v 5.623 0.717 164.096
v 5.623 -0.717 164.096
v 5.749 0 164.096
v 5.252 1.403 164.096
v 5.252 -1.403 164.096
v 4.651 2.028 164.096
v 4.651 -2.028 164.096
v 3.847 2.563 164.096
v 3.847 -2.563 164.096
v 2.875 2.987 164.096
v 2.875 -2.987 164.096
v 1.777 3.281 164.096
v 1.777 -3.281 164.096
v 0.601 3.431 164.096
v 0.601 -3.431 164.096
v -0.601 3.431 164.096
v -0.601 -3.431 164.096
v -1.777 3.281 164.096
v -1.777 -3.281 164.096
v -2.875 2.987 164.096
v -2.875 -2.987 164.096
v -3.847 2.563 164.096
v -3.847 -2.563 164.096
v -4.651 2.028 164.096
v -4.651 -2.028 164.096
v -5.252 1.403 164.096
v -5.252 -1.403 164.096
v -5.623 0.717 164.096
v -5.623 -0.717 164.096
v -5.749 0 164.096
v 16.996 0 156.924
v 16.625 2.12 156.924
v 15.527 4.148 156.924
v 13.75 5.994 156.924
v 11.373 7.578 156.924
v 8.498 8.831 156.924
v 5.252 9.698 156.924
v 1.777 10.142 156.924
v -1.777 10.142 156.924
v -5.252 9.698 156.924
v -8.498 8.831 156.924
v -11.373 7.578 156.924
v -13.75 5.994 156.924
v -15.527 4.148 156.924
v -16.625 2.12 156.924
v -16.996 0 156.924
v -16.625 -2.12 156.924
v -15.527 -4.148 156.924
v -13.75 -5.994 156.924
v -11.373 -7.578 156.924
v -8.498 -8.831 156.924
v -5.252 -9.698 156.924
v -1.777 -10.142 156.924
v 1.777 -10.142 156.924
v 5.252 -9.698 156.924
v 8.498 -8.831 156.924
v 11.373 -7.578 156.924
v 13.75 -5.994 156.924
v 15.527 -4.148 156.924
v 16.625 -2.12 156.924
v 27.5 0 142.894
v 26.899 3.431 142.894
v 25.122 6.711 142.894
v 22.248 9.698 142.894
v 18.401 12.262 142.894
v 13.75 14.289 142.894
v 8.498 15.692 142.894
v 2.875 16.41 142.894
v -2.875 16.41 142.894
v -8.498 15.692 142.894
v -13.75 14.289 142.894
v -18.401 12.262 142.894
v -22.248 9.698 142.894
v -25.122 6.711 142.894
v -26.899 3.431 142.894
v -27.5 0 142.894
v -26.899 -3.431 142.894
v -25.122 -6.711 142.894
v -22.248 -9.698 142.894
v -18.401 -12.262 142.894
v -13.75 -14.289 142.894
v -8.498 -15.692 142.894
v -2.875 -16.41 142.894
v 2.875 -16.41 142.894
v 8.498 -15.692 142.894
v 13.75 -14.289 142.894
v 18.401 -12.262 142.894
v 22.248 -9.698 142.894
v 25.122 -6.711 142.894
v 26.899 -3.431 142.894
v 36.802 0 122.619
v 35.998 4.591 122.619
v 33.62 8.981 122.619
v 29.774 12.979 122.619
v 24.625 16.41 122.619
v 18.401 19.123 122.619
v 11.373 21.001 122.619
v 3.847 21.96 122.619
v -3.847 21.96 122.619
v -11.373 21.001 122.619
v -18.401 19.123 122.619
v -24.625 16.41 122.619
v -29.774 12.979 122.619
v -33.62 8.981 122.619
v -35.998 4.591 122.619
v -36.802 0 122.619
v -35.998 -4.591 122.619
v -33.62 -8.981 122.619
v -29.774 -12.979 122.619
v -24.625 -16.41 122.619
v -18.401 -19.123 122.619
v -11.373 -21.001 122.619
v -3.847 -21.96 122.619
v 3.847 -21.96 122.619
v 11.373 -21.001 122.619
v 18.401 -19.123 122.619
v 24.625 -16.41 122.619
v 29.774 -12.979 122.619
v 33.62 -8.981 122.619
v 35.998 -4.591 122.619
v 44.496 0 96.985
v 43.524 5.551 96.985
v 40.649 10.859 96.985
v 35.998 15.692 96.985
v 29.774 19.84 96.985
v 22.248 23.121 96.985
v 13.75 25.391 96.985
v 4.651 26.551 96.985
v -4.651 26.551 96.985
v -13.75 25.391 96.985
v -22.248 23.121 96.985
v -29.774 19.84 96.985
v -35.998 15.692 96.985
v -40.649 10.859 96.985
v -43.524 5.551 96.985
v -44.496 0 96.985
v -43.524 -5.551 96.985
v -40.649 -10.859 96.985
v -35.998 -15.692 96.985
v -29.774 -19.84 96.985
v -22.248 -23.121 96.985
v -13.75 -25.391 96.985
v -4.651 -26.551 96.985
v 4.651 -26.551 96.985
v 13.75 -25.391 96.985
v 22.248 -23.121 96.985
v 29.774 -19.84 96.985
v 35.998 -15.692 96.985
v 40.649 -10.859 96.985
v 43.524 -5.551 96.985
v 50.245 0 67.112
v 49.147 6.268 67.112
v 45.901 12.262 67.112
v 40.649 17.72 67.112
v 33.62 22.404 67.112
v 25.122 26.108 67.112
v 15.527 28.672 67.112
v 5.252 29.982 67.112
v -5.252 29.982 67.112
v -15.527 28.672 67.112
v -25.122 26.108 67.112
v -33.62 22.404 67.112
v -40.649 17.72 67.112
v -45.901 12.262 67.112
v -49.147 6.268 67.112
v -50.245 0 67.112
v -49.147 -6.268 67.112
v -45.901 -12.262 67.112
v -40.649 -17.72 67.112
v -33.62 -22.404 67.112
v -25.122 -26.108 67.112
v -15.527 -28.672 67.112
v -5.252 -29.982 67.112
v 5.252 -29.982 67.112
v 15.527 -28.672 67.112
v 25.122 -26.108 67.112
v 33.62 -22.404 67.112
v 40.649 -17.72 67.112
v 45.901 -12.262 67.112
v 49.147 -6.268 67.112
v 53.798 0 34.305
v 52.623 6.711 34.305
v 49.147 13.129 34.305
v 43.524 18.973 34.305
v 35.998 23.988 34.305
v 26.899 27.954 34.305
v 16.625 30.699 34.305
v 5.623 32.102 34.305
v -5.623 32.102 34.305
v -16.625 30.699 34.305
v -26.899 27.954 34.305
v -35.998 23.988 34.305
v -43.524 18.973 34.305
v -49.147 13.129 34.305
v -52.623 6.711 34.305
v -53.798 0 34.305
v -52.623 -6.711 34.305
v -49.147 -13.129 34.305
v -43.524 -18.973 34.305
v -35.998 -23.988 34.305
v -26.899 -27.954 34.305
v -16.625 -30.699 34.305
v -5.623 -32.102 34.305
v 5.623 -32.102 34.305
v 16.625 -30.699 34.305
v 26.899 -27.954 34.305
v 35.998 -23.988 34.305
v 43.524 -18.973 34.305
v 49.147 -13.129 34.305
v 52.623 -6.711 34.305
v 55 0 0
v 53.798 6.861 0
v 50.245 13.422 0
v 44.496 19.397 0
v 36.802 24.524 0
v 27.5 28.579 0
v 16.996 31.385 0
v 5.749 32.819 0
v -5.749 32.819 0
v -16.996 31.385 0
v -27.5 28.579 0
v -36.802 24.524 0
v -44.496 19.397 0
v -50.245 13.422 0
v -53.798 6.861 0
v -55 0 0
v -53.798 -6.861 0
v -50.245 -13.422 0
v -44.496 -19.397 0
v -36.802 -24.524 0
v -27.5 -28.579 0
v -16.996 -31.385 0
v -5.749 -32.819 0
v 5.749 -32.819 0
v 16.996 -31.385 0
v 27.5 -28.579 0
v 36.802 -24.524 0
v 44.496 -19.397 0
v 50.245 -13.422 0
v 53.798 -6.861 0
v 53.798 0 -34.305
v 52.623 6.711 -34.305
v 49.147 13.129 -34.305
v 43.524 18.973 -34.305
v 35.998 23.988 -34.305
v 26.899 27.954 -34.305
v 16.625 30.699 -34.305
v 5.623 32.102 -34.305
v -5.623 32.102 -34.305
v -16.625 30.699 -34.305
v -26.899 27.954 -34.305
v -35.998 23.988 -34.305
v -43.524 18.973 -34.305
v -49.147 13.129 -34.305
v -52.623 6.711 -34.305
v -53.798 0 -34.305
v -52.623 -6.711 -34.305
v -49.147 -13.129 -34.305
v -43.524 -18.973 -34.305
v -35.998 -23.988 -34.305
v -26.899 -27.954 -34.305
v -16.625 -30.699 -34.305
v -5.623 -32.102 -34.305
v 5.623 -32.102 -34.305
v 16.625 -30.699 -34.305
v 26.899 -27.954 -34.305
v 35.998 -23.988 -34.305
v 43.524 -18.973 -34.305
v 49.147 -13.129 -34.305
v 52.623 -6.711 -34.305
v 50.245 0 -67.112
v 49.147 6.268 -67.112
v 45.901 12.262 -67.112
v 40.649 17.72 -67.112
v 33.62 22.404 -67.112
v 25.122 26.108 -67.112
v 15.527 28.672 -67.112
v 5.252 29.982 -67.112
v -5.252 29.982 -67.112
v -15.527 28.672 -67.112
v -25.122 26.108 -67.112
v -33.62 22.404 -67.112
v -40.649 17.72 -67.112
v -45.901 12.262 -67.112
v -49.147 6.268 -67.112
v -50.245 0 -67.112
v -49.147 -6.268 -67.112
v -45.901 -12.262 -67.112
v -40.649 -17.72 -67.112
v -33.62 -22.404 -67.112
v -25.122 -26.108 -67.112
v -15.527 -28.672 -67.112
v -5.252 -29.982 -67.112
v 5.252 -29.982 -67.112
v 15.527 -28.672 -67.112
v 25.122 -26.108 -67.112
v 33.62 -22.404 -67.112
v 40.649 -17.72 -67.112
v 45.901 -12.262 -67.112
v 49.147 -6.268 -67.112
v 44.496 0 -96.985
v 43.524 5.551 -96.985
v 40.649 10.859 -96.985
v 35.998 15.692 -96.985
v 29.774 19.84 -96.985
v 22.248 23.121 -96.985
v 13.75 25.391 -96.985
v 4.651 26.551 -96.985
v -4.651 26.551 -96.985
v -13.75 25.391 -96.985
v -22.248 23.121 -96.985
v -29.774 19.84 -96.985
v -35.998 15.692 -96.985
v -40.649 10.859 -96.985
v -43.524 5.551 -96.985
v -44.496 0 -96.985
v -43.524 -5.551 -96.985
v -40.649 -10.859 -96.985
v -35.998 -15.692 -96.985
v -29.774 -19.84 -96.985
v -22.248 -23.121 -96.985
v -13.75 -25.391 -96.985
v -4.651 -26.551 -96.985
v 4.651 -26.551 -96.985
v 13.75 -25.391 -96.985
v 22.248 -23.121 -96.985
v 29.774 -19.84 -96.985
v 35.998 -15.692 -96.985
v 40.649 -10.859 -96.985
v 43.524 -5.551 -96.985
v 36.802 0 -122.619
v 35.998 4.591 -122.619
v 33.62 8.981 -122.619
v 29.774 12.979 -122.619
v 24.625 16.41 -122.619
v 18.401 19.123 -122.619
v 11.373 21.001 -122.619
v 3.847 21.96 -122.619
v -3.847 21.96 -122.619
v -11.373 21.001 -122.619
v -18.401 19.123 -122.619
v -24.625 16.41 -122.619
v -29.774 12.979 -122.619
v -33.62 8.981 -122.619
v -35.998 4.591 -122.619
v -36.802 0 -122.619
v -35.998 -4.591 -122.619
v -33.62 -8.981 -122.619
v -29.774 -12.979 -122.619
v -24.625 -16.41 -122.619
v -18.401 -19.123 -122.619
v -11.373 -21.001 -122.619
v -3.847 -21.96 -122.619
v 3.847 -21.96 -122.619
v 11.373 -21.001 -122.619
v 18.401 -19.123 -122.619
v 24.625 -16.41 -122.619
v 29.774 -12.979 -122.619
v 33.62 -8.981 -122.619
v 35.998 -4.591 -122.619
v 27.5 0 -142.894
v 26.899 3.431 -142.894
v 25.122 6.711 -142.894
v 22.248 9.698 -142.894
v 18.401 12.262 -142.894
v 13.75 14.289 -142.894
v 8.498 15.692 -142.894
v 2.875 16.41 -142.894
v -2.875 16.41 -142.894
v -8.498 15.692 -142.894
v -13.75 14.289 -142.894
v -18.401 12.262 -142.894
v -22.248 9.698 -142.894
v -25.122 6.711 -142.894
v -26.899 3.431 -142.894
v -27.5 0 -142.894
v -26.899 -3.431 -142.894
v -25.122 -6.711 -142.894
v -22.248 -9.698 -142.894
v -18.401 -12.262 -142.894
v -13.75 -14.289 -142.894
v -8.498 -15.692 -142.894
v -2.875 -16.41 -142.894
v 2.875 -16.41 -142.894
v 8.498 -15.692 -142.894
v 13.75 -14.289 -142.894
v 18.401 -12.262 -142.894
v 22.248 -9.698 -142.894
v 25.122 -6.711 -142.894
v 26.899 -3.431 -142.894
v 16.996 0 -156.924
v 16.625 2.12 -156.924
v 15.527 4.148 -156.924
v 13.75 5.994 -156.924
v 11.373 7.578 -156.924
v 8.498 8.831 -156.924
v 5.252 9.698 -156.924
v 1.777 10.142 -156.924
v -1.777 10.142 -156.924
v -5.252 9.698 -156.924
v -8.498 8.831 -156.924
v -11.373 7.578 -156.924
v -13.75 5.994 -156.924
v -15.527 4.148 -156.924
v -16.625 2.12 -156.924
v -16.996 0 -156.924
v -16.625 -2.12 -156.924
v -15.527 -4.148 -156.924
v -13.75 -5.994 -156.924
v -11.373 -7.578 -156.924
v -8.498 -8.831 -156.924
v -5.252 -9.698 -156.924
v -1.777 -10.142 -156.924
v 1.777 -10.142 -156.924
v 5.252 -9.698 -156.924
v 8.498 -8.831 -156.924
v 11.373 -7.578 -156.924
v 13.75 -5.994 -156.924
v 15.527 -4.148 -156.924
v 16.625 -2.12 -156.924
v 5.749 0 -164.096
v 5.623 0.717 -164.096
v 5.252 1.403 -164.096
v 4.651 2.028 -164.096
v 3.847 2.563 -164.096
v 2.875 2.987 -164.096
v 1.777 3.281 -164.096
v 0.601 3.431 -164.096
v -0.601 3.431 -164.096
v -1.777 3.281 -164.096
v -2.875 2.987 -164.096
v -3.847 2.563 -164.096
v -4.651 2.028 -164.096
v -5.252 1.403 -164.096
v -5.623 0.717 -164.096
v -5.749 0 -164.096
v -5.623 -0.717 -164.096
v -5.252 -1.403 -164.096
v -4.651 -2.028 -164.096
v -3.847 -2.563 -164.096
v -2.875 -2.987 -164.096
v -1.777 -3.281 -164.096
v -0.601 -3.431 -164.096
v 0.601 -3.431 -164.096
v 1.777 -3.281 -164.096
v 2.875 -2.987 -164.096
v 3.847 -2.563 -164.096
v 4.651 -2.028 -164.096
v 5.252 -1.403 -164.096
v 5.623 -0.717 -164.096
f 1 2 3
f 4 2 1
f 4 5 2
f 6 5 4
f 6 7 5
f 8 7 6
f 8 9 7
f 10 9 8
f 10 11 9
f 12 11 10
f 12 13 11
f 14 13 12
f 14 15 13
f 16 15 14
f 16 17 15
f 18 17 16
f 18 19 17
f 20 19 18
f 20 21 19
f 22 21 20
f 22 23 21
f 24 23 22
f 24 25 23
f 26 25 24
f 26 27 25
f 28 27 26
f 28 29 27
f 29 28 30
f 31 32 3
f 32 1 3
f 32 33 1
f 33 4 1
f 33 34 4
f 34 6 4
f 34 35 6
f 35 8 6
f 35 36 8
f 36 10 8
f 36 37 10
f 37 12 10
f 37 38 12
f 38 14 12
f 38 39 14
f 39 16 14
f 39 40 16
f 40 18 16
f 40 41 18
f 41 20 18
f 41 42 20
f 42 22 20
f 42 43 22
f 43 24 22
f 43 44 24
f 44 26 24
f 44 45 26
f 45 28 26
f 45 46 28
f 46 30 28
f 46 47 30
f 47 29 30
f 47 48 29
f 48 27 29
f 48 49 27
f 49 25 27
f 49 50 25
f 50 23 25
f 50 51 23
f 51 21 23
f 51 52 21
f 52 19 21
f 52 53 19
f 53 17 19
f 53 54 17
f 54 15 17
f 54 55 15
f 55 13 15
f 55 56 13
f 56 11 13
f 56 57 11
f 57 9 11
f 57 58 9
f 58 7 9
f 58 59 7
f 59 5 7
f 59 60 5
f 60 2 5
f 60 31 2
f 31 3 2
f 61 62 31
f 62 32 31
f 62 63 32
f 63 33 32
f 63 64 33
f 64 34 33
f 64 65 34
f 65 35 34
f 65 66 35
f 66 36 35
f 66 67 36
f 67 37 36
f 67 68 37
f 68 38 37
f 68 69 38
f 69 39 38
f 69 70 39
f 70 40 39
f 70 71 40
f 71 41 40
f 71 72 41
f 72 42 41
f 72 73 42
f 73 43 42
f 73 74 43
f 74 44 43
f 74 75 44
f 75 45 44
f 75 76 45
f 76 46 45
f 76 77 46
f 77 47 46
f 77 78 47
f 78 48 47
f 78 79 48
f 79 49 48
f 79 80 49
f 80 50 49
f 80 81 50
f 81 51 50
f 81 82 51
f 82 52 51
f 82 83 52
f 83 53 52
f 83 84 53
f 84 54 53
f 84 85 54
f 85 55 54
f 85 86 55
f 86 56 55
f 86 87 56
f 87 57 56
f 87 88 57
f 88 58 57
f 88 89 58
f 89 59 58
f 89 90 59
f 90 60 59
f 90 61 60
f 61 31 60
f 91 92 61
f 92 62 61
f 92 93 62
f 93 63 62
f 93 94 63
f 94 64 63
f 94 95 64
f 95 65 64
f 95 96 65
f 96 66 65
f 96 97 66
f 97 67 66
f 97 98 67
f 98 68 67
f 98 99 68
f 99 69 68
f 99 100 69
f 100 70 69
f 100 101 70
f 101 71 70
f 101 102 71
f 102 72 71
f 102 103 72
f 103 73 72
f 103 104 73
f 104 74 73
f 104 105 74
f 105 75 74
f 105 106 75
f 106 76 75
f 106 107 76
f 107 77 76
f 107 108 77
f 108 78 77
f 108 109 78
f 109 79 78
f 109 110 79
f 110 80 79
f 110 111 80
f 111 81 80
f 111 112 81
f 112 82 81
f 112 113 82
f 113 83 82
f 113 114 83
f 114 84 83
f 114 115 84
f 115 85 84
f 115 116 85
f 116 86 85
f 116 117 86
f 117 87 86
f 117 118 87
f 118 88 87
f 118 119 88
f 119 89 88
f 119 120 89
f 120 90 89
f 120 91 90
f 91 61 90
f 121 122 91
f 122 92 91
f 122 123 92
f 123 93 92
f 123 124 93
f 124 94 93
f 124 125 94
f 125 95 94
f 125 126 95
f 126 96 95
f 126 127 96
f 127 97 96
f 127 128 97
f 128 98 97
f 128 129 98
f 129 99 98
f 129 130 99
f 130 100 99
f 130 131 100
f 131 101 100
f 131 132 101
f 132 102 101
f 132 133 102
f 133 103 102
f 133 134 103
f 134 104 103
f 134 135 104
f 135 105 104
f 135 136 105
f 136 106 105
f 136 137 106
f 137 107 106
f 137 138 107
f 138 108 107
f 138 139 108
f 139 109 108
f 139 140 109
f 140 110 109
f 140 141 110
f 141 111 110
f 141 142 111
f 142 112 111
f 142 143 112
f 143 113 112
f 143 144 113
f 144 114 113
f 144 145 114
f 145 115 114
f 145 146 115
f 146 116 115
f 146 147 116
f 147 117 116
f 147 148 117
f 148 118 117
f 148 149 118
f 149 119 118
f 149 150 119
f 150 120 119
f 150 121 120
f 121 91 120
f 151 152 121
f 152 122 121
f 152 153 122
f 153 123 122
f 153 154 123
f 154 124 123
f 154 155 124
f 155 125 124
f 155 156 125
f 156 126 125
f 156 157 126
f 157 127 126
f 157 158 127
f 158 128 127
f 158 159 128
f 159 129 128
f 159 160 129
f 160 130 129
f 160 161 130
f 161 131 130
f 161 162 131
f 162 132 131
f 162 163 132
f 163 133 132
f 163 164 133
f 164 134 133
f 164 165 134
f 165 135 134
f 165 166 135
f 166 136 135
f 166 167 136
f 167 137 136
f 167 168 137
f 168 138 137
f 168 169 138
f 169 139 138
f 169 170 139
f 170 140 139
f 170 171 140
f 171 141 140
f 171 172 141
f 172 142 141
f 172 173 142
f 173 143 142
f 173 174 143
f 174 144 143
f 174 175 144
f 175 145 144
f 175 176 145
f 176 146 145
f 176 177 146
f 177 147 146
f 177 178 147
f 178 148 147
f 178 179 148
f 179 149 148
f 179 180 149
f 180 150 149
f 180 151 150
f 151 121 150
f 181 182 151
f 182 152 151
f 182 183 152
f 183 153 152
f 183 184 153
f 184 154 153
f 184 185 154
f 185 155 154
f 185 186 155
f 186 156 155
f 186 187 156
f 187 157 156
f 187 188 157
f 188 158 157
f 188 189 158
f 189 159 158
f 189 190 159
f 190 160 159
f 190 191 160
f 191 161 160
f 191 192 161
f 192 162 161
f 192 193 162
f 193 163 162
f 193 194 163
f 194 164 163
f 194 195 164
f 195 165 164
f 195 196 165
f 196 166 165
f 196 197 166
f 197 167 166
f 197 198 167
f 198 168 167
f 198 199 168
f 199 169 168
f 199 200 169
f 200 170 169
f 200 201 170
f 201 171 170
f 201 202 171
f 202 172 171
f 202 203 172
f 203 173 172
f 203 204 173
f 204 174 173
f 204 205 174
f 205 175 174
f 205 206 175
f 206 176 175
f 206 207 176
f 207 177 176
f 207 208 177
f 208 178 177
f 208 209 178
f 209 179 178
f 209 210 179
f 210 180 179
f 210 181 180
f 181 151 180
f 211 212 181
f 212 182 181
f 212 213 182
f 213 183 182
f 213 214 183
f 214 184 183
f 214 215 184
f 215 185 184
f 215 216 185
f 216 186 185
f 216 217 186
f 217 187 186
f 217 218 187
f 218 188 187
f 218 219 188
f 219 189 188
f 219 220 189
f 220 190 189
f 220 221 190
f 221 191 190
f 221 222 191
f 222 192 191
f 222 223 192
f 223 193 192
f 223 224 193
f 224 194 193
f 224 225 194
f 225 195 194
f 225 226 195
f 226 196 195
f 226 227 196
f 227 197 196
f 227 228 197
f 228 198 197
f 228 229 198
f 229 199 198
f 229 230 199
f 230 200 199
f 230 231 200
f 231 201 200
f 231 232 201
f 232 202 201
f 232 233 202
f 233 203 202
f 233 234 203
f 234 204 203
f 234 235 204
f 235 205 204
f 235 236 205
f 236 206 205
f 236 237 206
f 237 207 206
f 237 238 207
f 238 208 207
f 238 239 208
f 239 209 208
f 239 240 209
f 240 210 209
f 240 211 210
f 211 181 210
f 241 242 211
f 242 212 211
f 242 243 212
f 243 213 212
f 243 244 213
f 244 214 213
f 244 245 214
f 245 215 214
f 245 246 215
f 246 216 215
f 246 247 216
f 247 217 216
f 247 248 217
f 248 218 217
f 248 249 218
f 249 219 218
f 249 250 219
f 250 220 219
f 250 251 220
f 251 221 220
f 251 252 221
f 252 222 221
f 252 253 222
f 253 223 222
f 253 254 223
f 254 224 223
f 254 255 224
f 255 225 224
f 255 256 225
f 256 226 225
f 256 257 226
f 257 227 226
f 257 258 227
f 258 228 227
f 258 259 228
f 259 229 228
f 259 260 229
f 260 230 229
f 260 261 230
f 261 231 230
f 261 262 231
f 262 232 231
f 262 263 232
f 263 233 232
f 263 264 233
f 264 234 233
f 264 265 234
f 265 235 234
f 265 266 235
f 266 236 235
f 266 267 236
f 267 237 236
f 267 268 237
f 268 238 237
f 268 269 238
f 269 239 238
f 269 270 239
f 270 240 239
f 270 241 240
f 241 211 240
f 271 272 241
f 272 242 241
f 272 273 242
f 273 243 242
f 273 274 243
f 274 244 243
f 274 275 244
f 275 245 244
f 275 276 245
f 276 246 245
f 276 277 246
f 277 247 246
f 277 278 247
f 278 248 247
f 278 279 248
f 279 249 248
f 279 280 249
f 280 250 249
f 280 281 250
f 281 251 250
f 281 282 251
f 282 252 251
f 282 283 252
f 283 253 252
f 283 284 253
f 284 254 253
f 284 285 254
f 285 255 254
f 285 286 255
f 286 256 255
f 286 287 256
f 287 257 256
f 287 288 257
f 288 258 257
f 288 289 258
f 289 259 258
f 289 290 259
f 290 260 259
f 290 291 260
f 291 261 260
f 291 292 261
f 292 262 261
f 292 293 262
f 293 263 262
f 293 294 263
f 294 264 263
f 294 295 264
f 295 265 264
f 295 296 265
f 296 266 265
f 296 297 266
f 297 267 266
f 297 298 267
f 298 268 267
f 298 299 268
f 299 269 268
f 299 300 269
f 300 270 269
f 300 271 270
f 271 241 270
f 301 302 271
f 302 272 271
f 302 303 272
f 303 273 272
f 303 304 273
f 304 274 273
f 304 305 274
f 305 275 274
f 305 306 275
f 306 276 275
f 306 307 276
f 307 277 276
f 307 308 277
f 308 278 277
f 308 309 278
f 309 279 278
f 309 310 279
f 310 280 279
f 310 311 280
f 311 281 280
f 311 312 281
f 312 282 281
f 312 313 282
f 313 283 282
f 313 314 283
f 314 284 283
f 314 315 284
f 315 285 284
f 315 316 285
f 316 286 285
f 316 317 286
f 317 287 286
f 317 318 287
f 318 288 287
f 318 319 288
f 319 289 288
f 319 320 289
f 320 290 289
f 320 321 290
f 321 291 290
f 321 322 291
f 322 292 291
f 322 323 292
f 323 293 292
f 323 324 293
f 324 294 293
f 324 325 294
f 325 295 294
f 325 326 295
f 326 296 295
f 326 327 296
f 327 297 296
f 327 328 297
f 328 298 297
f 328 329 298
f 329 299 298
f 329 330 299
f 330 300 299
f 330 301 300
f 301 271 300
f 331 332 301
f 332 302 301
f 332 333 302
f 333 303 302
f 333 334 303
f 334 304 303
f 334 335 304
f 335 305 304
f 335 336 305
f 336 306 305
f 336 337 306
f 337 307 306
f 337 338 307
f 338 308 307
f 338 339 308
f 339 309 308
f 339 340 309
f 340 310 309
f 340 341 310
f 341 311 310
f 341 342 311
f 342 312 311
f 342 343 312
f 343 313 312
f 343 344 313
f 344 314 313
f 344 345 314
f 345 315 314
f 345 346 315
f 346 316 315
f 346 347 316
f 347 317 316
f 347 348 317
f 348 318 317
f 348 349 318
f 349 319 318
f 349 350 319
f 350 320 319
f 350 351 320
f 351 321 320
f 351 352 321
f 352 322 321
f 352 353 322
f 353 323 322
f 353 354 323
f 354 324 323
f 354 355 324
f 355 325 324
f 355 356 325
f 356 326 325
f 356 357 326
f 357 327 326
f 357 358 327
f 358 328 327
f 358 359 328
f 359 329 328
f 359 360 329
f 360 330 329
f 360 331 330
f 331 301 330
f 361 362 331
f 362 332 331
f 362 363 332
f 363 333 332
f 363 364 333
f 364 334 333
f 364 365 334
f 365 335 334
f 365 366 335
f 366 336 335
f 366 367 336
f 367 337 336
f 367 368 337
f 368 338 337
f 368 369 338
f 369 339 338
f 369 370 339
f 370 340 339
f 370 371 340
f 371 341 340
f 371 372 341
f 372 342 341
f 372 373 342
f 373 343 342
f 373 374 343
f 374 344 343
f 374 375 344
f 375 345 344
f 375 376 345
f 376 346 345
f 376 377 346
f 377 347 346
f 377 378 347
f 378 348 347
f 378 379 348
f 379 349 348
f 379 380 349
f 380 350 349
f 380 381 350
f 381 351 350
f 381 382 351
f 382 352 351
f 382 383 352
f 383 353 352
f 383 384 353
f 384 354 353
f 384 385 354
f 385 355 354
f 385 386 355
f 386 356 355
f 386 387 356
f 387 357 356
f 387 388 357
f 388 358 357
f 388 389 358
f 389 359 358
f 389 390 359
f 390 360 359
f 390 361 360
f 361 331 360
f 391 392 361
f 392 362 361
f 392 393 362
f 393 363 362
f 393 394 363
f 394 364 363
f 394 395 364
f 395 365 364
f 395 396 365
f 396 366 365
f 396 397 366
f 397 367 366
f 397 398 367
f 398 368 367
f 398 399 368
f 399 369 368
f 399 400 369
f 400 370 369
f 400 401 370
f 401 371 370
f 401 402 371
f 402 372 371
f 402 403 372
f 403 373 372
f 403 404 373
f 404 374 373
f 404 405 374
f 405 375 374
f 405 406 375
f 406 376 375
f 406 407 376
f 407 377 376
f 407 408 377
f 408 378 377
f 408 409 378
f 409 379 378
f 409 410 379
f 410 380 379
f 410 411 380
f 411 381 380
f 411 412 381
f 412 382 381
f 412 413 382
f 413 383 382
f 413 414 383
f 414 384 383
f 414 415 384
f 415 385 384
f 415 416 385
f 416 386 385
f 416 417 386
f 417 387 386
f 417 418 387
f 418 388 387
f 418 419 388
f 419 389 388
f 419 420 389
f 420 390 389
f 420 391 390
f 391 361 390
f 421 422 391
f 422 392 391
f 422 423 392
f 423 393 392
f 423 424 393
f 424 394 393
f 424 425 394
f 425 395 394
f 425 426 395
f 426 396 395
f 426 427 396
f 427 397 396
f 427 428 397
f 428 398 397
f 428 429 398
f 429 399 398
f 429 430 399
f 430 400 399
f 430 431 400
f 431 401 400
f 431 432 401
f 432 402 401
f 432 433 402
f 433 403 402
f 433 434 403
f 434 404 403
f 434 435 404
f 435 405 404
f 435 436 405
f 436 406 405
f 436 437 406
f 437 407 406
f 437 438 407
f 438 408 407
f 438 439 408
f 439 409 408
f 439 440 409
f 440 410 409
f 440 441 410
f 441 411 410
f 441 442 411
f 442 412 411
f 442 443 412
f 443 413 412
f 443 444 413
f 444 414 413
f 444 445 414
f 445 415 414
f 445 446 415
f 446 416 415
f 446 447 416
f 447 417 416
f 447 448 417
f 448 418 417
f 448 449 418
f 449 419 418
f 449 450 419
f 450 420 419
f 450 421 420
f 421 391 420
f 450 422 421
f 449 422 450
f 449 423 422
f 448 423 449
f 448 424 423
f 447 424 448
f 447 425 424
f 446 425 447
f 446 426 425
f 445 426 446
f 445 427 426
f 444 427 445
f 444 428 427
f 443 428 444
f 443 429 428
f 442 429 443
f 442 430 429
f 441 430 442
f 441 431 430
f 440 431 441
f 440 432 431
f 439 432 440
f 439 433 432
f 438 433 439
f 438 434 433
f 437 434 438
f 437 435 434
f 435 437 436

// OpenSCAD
// Generated by SolidPython 1.0.1 on 2020-07-29 00:46:46


scale(v = [5, 3, 15]) {
	sphere(r = 11);
}
/***********************************************
*********      SolidPython code:      **********
************************************************
 
# import packages: SolidPython
from solid import *
from solid.utils import *
from itertools import chain, combinations, permutations


class Resize:

    def __init__(self, scad_file):
        self.scad_file = scad_file
        #self.scad_file = import_scad(scad_file)
        # cone/cylinder param:
        self.r1 = 0
        self.r2 = 0
        self.h = 0
        # rectangular prism param:
        self.w = 0
        self.l = 0
        # ellipse param:
        self.r = 0

    # import OpenScad code (file name corresponds to shape)


    # classify shape + parameters
    def assign(self, param1, param2, param3):
        if self.scad_file == 'cone.scad':
            self.r1 = param1
            self.r2 = param2
            self.h = param3
        elif self.scad_file == 'cylinder.scad':
            self.r1 = param1
            self.r2 = param2
            self.h = param3
        elif self.scad_file == 'rectangularPrism.scad':
            self.h = param1
            self.l = param2
            self.w = param3
        else:
            self.r = param1
            self.h = param2

    # resize parameters
    def iterate(self):
        x = range(3, 20, 2)
        i = 1
        if self.scad_file == 'cone.scad':
            tempList = list(permutations(x, 2))
            for temp in tempList:
                param1 = temp[0]
                param2 = temp[1]
                filepath = 'produced_scad_files/' + 'cone' + str(param1) + '_' + str(param2) + '_' + '.scad'
                scad_render_to_file(cylinder(h=param1, r1=param2, r2=0), filepath)

        elif self.scad_file == 'cylinder.scad':
            tempList = list(permutations(x, 3))
            for temp in tempList:
                param1 = temp[0]
                param2 = temp[1]
                filepath = 'produced_scad_files/' + 'cylinder' + str(param1) + '_' + str(param2) + '_' + '.scad'
                scad_render_to_file(cylinder(h=param1, r1=param2, r2=param2), filepath)

        elif self.scad_file == 'rectangularPrism.scad':
            tempList = list(permutations(x, 3))
            for temp in tempList:
                param1 = temp[0]
                param2 = temp[1]
                param3 = temp[2]
                filepath = 'produced_scad_files/' + 'rectangularPrism' + str(param1) + '_' + str(param2) + '_' + str(
                    param3) + '.scad'
                scad_render_to_file(cube(size=(param1, param2, param3)), filepath)

        elif self.scad_file == 'ellipse.scad':
            tempList = list(permutations(x, 4))
            for temp in tempList:
                param1 = temp[0]
                param2 = temp[1]
                param3 = temp[2]
                param4 = temp[3]
                filepath = 'produced_scad_files/' + 'ellipse' + str(param1) + '_' + str(param2) + '_' + str(param3) + '_' + str(param4) + '.scad'
                scad_render_to_file(scale([param1, param2, param3])(sphere(r=param4)), filepath)

    def render_to_scadfile(self):
        scad_render_to_file(scad, 'example.scad') 
 
************************************************/
